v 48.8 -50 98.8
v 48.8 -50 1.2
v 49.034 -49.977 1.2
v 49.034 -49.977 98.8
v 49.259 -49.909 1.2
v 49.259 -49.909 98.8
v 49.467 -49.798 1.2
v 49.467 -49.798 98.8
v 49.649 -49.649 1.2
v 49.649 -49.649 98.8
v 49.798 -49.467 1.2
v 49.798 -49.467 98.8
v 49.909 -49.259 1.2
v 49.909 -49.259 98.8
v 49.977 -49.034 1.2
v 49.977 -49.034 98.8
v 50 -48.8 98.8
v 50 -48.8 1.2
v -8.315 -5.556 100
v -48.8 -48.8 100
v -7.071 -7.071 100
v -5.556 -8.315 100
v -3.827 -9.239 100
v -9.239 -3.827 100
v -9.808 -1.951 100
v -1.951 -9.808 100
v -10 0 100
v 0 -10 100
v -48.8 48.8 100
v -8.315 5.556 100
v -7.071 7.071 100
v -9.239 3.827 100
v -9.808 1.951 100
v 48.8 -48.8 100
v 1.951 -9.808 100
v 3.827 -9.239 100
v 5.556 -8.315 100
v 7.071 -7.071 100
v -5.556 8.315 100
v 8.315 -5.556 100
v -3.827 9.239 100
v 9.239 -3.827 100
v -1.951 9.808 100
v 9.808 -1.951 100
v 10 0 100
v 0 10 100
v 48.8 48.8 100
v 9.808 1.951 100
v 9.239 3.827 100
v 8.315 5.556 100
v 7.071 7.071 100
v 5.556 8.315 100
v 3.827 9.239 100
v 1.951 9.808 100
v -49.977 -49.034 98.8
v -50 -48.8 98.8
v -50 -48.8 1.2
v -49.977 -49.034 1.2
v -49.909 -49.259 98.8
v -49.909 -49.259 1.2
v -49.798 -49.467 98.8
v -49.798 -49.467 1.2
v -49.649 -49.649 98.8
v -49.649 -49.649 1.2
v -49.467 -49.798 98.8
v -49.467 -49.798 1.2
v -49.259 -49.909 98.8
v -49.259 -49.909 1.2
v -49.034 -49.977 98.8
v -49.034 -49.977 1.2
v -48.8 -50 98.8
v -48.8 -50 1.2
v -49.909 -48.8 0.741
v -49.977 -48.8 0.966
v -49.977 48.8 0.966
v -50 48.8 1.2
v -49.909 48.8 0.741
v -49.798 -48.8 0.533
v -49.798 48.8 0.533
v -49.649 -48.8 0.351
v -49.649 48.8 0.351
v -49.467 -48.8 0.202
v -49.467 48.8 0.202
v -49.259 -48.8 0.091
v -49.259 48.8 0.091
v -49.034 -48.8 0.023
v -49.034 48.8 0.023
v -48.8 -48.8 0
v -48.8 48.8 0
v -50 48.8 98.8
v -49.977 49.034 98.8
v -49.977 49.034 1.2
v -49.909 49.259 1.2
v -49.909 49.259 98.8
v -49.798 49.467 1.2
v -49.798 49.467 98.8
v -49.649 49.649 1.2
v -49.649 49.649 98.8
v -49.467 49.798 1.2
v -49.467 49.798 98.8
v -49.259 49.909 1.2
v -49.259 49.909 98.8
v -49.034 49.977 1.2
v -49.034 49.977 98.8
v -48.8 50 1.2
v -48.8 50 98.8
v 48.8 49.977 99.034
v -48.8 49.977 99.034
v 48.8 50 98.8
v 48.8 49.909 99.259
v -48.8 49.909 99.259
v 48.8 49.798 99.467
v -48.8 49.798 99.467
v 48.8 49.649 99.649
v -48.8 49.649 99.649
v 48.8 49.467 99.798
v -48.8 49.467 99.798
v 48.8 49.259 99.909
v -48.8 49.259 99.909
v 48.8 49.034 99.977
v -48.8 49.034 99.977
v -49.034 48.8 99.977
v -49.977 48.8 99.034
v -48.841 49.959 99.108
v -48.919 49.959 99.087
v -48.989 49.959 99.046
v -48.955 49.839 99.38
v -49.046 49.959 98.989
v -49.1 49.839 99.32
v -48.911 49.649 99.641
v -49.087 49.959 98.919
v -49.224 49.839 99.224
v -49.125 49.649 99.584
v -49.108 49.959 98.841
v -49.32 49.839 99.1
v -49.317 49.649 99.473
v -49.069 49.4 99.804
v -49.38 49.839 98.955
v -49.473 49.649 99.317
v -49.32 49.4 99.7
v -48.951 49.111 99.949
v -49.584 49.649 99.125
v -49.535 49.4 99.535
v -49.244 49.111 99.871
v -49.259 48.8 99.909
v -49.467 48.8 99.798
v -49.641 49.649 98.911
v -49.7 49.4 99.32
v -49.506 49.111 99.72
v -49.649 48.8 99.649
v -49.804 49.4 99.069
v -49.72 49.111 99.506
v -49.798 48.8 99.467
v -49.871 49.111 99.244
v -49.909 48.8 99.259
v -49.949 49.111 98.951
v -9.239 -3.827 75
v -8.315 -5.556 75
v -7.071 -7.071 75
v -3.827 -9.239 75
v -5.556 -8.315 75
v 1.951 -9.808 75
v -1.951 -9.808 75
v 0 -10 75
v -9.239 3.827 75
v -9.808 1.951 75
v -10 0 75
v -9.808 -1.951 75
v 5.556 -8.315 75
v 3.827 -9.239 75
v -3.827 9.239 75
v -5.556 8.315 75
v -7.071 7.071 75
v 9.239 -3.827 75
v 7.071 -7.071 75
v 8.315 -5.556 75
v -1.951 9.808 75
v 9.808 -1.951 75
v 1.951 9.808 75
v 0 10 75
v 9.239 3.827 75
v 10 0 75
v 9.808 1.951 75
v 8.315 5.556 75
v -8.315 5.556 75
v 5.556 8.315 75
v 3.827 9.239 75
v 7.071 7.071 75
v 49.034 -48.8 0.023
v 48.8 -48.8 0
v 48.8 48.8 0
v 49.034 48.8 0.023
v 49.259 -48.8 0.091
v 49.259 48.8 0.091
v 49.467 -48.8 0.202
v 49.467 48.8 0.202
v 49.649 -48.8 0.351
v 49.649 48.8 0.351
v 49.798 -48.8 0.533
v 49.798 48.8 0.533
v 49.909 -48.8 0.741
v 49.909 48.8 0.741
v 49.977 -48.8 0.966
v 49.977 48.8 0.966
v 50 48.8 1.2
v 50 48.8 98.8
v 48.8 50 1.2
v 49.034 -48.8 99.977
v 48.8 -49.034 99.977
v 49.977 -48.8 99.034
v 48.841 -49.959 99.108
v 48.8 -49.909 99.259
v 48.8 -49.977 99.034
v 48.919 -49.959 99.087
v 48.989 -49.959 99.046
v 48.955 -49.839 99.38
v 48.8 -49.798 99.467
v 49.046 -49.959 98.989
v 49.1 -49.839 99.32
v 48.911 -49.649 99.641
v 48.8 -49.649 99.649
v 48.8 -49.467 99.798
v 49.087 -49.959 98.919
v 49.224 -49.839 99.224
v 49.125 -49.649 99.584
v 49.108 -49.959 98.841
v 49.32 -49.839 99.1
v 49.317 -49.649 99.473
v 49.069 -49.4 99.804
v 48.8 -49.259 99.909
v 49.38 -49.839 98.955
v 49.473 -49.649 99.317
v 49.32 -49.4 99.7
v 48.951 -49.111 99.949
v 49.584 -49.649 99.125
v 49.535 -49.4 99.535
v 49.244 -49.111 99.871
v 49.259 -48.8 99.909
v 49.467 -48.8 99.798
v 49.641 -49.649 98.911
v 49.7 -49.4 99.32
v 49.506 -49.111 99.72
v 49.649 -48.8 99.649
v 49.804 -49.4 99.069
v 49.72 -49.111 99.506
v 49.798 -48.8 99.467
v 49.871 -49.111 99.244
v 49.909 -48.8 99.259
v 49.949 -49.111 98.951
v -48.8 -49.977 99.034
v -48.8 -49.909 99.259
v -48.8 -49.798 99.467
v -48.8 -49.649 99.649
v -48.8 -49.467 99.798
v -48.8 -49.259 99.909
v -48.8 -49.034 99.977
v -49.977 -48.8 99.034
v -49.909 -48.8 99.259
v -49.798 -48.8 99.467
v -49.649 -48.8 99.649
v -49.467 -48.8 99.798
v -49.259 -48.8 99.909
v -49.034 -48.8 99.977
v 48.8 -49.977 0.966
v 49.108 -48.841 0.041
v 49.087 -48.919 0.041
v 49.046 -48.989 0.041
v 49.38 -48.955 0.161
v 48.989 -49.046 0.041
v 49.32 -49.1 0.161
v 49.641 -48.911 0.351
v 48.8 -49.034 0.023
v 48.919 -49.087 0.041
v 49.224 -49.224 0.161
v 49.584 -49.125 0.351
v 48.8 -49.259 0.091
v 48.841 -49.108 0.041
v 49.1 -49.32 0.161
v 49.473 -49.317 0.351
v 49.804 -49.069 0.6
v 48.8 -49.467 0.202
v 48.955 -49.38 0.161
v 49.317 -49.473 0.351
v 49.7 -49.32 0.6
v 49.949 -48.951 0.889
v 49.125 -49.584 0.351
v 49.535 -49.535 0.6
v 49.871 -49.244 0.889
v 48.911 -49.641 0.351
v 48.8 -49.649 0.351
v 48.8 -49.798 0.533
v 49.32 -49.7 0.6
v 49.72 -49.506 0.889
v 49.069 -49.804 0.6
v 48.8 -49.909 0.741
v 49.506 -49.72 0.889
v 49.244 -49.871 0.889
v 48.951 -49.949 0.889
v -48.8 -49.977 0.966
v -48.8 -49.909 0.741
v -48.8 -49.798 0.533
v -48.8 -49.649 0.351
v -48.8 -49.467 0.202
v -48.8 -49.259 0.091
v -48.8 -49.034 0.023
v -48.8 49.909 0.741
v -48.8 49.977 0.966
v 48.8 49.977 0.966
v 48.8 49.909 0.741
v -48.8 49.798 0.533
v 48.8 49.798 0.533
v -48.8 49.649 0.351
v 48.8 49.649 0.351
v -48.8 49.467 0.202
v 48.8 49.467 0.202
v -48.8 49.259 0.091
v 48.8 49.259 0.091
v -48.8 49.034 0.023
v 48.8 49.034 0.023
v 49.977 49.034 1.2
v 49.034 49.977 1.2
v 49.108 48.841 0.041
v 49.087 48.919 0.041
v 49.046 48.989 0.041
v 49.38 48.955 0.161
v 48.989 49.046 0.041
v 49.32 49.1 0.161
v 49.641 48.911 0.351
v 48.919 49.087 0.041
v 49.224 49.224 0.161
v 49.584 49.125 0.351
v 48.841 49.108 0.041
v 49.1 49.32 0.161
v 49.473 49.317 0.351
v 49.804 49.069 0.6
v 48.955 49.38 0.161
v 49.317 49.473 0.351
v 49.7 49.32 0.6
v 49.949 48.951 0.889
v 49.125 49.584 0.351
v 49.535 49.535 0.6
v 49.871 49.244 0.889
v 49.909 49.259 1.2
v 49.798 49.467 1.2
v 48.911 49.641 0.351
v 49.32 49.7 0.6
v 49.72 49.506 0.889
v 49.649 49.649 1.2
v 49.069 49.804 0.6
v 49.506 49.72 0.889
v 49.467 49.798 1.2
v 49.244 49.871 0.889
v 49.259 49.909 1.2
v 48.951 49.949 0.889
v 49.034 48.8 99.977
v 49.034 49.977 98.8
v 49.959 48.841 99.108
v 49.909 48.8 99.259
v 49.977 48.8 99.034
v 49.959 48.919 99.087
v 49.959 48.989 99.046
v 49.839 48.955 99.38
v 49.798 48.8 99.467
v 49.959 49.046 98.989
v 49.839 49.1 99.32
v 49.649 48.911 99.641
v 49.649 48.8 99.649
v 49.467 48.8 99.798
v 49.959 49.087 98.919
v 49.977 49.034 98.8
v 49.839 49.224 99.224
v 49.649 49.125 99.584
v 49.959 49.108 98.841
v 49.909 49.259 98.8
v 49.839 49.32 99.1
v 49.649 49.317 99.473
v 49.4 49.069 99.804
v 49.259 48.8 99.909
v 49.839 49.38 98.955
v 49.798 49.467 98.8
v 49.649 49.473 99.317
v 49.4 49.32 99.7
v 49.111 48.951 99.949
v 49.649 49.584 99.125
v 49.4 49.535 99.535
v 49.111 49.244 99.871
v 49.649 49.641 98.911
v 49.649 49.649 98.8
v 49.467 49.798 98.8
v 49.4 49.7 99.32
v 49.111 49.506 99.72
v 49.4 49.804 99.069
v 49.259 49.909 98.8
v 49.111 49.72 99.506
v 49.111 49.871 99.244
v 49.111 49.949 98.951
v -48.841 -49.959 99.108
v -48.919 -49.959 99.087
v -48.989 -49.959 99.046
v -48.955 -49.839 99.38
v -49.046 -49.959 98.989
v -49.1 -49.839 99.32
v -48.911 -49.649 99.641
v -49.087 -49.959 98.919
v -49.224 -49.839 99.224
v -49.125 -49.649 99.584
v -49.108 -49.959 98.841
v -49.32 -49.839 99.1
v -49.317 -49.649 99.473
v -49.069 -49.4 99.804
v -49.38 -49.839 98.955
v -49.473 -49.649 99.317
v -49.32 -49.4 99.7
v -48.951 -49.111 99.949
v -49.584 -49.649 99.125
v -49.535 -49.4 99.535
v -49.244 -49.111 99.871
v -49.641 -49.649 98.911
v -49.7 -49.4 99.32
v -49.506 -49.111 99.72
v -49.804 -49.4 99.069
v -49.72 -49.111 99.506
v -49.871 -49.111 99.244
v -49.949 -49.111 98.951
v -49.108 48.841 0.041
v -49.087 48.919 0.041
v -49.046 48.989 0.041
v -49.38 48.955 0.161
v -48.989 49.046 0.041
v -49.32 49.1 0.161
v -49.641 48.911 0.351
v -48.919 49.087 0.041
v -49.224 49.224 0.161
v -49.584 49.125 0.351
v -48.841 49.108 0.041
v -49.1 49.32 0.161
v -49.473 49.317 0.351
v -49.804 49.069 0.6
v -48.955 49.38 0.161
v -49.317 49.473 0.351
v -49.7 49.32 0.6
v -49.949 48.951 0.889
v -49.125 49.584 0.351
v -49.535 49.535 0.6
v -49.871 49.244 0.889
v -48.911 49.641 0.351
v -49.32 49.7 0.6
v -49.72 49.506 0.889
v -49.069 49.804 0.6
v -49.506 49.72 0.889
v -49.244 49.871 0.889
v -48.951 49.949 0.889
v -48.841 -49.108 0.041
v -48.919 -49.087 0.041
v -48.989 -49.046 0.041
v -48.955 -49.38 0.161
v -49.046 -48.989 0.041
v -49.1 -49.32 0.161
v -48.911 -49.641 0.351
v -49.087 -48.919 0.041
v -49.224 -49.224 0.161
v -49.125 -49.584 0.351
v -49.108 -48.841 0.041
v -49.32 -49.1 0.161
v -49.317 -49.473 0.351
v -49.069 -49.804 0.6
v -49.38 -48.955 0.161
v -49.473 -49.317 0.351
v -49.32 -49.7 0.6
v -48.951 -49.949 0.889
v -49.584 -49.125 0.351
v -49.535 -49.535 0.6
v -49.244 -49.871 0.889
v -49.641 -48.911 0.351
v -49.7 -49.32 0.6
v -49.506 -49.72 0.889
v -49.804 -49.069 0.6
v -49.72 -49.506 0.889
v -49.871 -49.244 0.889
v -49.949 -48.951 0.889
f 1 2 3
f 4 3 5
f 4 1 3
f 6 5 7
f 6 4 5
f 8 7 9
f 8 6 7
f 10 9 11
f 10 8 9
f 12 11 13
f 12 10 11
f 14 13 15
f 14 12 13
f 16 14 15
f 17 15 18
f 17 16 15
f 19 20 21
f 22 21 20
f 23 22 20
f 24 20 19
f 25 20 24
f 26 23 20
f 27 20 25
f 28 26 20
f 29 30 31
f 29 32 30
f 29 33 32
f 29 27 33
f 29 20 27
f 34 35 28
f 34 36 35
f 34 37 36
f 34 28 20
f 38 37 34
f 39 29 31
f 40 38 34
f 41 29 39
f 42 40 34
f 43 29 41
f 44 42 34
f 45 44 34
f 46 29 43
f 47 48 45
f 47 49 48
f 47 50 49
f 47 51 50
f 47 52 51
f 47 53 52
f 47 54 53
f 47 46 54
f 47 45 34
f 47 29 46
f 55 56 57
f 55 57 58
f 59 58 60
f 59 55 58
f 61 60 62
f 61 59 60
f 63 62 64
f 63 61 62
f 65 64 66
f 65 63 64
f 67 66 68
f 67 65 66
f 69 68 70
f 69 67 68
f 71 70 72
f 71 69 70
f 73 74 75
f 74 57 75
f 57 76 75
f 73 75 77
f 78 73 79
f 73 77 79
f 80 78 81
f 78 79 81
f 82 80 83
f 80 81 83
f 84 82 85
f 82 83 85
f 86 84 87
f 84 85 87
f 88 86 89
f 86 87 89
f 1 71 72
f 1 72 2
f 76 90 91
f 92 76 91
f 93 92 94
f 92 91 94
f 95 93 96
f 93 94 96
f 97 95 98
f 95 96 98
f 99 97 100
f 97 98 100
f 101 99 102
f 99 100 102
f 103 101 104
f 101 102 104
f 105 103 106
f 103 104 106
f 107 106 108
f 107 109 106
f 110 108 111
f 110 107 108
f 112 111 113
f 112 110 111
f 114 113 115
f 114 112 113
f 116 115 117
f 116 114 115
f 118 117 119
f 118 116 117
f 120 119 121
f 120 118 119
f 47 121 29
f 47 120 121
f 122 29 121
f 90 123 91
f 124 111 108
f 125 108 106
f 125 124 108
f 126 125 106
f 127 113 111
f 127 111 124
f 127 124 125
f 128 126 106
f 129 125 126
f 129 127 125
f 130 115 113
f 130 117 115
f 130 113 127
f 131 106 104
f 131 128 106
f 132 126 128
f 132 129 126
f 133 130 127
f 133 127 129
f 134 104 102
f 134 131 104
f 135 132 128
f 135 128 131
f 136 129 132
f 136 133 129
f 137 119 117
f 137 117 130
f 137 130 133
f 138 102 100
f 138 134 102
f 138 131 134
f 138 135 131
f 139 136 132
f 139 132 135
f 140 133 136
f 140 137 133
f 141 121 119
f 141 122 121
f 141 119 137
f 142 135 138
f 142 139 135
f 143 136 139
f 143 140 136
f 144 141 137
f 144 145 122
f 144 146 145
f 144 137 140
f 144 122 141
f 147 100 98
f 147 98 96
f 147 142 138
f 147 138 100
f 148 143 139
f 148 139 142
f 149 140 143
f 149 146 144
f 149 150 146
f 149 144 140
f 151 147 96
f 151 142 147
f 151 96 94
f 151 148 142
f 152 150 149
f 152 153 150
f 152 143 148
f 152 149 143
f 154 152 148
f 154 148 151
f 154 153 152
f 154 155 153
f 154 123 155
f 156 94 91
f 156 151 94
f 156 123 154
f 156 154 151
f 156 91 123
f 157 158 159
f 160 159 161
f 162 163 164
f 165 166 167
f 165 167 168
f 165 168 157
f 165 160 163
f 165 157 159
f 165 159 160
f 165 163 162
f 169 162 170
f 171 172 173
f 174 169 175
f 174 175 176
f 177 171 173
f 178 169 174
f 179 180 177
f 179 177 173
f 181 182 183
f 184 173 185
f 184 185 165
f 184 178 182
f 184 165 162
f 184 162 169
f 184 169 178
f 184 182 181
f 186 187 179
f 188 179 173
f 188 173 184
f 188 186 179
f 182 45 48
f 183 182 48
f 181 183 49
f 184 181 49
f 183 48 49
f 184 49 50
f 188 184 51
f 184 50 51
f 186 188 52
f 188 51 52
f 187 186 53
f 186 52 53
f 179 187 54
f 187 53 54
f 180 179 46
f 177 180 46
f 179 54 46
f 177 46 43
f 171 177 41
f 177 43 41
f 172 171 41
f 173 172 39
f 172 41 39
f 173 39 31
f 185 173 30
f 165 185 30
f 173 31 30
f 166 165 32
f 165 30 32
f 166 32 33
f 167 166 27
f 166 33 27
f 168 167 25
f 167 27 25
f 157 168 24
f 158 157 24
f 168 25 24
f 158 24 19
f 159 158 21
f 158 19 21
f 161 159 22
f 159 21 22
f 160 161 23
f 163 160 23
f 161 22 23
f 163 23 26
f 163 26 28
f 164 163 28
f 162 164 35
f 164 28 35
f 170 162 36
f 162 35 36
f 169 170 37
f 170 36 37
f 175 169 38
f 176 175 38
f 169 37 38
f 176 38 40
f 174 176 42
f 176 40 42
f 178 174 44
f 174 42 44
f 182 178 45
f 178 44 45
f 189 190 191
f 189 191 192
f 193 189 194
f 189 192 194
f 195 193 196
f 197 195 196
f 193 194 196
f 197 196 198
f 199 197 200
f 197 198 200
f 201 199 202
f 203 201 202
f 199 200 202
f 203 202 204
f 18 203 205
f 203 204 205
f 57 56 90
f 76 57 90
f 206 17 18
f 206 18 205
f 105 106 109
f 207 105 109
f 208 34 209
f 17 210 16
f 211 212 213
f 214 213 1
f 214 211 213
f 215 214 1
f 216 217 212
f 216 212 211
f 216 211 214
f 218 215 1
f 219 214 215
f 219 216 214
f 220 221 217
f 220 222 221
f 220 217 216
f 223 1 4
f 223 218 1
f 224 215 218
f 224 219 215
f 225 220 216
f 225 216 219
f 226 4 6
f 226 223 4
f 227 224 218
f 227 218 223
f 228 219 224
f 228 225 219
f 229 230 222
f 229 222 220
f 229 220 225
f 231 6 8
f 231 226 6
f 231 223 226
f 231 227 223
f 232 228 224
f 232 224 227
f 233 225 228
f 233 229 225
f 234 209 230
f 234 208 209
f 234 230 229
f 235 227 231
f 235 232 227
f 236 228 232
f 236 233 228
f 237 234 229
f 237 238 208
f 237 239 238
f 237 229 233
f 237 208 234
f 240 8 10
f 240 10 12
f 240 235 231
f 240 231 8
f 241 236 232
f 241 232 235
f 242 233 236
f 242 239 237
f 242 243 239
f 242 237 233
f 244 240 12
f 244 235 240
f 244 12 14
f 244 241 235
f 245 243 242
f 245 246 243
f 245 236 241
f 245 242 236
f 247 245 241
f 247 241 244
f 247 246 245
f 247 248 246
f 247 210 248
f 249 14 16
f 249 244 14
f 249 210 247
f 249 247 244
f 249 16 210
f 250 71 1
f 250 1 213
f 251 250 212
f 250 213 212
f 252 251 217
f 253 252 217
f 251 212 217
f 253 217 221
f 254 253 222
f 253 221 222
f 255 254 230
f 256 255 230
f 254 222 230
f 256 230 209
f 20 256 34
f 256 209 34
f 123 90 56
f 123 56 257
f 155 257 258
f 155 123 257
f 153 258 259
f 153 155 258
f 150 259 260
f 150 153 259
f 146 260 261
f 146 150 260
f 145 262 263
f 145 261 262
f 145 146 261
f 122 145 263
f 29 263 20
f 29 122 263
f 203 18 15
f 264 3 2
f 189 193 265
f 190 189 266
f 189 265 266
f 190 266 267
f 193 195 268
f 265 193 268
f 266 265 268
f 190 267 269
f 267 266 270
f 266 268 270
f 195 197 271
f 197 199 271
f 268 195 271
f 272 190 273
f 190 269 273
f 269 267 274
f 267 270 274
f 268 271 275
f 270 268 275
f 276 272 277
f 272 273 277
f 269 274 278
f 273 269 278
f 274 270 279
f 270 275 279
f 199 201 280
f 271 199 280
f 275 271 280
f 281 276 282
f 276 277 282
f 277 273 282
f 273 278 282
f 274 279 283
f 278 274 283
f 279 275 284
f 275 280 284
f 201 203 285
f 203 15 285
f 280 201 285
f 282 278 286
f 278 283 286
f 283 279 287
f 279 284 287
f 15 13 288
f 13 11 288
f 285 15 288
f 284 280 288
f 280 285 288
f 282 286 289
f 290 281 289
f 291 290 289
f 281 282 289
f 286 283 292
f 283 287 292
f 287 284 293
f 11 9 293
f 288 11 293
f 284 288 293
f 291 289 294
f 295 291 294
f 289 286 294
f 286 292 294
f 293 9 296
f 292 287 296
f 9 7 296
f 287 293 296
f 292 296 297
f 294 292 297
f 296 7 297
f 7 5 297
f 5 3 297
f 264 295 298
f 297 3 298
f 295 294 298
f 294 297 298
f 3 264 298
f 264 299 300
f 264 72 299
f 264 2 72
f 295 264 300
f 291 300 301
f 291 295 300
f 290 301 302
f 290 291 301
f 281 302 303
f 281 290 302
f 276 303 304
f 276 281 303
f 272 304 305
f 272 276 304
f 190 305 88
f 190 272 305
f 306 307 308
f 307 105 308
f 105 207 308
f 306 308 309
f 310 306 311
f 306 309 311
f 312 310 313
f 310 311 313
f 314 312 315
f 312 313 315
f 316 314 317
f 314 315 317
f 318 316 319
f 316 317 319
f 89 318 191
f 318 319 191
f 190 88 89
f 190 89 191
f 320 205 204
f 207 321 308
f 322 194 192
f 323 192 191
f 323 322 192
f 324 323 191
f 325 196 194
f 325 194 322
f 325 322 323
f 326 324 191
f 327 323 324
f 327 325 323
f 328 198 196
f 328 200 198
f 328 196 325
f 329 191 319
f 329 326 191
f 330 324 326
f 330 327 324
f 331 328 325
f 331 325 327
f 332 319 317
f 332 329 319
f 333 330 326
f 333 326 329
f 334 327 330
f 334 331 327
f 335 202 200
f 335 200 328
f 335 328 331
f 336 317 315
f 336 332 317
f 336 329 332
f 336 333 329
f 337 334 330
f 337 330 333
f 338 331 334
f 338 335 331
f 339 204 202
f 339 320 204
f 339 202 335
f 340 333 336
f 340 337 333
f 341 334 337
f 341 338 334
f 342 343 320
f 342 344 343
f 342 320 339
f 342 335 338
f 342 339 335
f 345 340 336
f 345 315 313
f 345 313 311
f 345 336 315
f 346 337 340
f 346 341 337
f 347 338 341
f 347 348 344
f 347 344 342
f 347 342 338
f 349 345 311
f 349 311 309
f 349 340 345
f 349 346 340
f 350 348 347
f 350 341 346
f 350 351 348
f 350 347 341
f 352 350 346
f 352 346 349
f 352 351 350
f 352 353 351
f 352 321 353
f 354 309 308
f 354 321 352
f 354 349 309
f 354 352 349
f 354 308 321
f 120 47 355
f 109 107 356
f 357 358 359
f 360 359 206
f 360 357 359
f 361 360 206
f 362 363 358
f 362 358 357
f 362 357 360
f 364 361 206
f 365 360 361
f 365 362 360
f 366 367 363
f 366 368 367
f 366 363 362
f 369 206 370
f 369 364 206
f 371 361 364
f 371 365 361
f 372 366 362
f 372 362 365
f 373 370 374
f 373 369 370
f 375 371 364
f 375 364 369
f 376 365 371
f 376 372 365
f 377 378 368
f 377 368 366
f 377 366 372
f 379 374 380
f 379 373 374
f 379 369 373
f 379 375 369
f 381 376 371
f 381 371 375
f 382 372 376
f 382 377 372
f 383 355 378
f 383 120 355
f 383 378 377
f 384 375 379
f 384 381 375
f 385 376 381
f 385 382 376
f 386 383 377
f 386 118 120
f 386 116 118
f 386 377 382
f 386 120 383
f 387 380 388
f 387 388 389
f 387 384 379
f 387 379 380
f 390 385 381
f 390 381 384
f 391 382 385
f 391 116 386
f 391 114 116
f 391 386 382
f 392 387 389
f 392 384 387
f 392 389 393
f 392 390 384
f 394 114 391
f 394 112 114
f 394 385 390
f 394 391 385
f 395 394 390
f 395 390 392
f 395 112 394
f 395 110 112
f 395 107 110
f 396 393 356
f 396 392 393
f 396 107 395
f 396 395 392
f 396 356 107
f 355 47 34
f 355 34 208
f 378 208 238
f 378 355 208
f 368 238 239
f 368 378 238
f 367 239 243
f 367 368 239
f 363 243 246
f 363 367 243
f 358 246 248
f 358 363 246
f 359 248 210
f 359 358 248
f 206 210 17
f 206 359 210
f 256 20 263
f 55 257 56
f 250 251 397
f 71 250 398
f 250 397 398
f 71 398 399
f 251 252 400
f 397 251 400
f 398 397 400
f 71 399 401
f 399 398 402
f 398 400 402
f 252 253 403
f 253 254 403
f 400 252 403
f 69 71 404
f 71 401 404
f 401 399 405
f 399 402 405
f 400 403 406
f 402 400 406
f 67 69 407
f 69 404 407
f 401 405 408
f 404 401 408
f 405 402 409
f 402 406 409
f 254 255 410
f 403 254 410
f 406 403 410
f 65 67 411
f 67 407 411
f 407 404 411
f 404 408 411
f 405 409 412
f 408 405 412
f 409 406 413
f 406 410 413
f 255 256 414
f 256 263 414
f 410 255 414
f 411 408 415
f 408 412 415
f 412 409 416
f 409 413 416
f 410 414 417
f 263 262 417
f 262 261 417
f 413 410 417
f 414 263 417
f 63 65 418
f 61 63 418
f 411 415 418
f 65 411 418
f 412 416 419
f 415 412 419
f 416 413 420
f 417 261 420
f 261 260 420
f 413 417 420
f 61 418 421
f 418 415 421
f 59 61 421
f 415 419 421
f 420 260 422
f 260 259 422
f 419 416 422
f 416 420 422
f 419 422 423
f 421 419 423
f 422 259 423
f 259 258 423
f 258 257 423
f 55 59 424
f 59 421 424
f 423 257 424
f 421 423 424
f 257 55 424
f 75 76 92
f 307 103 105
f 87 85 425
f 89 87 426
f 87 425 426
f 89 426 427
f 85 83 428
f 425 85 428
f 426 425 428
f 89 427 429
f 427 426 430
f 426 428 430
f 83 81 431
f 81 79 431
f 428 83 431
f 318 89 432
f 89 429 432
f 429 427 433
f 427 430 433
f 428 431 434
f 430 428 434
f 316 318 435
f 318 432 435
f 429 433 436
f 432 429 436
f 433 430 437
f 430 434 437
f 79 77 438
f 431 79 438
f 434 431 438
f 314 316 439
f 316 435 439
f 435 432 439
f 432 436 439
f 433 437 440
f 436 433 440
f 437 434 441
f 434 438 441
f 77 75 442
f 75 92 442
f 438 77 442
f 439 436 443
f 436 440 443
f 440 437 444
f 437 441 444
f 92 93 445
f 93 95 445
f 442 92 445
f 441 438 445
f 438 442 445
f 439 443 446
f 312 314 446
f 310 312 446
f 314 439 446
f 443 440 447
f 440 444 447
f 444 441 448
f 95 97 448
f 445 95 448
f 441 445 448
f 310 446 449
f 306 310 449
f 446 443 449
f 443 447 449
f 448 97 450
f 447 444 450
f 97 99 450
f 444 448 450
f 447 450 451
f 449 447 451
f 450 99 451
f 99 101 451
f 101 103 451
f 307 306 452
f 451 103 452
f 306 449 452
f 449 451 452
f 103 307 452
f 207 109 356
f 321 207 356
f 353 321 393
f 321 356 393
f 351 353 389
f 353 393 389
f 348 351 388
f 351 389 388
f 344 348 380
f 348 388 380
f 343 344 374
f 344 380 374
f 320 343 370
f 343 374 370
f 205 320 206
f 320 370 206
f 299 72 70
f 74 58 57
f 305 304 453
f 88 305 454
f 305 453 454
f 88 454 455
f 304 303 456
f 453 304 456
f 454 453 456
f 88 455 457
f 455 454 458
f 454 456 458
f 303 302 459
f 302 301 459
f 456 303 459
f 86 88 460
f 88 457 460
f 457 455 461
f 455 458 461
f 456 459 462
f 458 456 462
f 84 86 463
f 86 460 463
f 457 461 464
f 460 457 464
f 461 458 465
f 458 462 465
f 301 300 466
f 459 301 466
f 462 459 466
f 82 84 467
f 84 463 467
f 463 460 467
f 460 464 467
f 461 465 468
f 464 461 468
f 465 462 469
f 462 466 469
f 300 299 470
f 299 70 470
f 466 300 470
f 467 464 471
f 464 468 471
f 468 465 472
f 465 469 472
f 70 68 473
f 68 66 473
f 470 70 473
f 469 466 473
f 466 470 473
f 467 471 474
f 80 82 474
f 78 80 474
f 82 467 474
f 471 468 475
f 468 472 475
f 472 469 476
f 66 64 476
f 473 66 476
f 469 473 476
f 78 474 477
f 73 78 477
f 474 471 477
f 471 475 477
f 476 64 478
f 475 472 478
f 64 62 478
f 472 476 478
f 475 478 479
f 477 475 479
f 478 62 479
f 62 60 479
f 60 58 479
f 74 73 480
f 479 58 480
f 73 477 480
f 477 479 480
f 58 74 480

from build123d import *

# Parameters (mm, degrees)
F0_W     = 100
F0_H     = 100
F1_DEPTH = 100
F2_R     = 10
F3_DEPTH = 25
F4_R     = 1.2


with BuildPart() as f1:
    # F0 (on Top) → F1 (new body)
    with BuildSketch(Plane.XY):
        Rectangle(F0_W, F0_H)
    extrude(amount=F1_DEPTH)

    # F2 (on face) → F3 (cut)
    with BuildSketch(Plane.XY.offset(100)):
        Circle(F2_R)
    extrude(amount=-F3_DEPTH, mode=Mode.SUBTRACT)

    # F4
    f4_edges = [f1.edges().sort_by_distance(p)[0] for p in [
        (-50, 0, 100),
        (0, 50, 100),
        (50, 0, 100),
        (0, -50, 100),
        (-50, -50, 50),
        (-50, 50, 50),
        (50, -50, 50),
        (50, 50, 50),
        (50, 0, 0),
        (0, -50, 0),
        (-50, 0, 0),
        (0, 50, 0),
    ]]
    fillet(f4_edges, radius=F4_R)


solid = f1.part
